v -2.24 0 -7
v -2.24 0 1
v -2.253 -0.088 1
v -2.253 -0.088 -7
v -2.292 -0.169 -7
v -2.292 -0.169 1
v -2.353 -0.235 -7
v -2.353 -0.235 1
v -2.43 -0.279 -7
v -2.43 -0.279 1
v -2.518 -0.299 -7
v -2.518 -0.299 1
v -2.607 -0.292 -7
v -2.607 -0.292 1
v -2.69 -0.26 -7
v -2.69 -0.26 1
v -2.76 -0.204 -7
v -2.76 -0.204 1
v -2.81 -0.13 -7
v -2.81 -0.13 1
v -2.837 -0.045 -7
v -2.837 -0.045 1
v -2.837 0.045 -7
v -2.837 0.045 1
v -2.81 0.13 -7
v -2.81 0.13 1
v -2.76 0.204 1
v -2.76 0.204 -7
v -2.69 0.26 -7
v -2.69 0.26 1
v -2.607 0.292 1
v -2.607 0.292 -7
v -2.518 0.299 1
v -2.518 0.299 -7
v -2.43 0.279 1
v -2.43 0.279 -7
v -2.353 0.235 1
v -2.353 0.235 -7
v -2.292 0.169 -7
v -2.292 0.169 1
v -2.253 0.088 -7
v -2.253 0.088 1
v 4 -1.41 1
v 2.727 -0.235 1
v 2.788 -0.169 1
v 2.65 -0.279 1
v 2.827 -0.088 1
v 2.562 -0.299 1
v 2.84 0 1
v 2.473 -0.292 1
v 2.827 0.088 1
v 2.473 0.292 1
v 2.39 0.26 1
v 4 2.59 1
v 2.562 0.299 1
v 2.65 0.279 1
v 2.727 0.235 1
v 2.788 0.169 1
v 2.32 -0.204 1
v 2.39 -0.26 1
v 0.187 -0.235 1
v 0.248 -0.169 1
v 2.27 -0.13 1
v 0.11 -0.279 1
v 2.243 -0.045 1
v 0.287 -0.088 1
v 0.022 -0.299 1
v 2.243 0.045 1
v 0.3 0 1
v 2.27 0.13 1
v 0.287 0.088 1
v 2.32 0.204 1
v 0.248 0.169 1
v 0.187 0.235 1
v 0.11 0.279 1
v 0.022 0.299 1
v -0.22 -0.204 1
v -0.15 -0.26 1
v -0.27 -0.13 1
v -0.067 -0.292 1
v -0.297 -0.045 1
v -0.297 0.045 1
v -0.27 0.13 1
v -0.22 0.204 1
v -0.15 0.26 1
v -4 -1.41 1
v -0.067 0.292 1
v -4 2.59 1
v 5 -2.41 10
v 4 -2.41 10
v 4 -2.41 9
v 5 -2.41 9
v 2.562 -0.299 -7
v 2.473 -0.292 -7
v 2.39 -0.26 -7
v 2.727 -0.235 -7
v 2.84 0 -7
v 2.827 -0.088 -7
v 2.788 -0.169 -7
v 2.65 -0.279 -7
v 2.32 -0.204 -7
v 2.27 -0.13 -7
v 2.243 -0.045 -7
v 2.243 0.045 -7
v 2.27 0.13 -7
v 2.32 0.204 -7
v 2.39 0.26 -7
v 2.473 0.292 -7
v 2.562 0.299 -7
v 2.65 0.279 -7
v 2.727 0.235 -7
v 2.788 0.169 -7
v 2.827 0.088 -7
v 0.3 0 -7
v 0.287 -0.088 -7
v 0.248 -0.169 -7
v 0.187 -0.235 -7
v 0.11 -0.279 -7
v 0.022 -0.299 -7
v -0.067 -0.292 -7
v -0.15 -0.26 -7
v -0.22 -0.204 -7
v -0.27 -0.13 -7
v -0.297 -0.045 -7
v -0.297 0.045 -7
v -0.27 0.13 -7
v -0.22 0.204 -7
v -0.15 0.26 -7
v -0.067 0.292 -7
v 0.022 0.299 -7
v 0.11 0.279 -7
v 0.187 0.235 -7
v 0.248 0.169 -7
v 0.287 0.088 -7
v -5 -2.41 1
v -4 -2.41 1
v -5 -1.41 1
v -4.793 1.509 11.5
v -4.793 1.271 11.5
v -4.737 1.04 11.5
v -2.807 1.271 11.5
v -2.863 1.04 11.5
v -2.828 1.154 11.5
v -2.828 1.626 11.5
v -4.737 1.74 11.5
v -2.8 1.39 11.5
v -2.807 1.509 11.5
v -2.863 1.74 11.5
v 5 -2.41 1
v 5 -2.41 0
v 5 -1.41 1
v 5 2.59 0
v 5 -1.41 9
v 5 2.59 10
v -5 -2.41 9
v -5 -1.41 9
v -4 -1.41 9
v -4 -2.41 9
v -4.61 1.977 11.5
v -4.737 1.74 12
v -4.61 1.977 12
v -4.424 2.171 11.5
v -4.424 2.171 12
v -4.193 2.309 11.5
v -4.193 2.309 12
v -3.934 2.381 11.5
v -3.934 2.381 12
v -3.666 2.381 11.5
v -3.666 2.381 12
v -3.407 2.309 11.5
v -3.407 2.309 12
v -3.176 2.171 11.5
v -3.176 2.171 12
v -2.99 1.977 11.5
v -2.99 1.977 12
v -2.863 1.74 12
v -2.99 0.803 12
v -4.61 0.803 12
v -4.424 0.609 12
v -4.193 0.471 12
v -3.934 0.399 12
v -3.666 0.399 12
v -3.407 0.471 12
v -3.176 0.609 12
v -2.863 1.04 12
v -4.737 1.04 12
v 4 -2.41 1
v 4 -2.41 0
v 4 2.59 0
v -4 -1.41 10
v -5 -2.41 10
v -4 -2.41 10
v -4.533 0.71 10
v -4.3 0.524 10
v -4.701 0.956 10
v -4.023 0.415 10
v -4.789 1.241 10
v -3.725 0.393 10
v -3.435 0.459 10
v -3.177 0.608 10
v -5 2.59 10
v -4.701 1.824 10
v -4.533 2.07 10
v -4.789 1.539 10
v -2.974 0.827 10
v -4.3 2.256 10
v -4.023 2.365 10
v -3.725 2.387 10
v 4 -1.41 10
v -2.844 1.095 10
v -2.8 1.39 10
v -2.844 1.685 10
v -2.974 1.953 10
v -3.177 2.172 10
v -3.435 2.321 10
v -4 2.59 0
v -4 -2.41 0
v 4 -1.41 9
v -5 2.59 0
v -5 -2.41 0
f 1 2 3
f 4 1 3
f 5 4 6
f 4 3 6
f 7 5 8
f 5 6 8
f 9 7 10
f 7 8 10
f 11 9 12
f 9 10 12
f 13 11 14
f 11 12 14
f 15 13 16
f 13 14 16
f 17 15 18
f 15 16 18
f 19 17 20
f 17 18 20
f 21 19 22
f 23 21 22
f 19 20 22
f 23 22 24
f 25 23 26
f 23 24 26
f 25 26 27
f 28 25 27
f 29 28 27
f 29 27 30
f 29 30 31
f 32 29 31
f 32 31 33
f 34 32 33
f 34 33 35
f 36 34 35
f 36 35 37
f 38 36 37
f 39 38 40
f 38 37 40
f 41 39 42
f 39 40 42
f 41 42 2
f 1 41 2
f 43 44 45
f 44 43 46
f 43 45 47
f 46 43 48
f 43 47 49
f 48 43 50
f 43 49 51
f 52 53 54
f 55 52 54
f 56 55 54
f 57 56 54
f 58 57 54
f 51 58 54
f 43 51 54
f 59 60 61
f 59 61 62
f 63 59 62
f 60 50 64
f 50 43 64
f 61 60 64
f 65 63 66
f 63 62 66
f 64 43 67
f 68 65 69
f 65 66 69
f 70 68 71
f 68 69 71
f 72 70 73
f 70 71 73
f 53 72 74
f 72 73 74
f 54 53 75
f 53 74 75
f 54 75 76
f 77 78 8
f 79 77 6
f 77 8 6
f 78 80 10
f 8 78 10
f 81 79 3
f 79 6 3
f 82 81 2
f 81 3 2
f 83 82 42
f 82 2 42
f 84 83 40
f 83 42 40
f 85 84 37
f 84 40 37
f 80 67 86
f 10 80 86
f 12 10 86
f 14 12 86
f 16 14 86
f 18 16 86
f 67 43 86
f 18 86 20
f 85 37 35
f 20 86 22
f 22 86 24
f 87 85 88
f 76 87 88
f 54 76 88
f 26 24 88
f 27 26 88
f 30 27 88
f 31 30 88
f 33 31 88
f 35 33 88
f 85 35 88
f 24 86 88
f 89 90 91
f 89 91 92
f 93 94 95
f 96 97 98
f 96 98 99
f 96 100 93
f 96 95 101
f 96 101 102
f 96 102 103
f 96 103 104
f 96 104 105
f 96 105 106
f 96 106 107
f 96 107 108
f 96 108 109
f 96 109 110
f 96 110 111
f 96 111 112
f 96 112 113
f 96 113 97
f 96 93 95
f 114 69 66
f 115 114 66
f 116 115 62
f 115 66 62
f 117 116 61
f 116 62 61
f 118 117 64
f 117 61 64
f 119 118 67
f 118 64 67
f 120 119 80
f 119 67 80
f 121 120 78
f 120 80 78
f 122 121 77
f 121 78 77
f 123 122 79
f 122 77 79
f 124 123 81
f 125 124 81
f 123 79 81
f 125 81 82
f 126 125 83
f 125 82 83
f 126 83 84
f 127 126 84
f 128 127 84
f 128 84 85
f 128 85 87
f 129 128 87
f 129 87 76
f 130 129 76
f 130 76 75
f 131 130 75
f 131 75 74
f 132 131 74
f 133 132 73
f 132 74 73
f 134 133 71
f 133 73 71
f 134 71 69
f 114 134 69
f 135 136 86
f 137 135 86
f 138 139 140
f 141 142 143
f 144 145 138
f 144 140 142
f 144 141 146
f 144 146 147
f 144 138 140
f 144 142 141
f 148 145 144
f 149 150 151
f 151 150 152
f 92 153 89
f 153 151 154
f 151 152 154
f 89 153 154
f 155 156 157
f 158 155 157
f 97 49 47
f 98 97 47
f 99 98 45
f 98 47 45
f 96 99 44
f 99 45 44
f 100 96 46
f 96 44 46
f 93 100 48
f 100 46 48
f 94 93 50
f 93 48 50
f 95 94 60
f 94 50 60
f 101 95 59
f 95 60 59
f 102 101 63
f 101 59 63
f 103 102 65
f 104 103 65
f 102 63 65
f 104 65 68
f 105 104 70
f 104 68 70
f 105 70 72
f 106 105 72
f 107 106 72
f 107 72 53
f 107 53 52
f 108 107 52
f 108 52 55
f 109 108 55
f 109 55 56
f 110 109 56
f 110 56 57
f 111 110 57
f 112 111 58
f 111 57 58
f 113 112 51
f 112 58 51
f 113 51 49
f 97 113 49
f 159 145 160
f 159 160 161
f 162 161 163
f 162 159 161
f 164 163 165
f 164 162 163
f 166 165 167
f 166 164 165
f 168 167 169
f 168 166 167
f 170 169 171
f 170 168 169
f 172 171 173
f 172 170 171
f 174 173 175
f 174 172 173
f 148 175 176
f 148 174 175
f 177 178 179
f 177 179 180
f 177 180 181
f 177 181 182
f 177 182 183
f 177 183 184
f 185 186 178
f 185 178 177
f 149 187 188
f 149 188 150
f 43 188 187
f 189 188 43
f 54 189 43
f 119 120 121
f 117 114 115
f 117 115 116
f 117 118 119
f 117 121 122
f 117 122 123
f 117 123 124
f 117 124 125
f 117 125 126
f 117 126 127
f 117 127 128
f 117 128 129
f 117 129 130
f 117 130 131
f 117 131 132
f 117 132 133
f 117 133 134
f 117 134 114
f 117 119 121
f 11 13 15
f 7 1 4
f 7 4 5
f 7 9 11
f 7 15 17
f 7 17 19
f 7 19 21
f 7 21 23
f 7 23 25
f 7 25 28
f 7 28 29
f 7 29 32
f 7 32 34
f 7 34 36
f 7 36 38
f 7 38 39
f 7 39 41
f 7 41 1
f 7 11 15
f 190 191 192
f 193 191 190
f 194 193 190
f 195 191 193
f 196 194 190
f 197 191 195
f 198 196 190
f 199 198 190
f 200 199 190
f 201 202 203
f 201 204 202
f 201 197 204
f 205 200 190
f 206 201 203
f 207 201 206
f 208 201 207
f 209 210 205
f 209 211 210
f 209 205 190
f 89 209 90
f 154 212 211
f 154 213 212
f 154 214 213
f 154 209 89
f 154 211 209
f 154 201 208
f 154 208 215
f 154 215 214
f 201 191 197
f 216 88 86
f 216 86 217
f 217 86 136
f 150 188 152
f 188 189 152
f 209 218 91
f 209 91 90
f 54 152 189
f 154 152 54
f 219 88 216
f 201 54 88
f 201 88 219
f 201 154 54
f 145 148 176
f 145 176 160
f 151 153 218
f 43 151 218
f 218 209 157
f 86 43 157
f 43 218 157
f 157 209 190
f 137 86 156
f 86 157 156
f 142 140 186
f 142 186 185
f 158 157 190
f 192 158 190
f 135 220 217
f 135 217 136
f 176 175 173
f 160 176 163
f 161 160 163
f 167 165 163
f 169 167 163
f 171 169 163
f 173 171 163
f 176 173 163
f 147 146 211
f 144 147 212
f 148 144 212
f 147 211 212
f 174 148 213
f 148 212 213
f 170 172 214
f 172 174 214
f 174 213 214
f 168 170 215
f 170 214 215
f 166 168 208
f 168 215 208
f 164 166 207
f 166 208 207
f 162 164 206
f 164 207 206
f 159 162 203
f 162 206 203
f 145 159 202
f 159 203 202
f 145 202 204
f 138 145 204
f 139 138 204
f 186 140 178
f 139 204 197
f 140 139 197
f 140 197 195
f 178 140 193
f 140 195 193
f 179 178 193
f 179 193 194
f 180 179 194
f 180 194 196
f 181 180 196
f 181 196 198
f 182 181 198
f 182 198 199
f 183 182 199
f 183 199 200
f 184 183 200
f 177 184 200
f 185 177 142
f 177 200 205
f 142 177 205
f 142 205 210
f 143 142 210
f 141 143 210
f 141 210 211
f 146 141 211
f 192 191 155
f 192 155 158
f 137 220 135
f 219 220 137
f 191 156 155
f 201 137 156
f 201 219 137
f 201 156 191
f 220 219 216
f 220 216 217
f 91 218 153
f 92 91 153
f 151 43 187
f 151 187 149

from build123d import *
from build123d.topology import SkipClean

# Parameters (mm, degrees)
SKETCH_1_W          = 5
SKETCH_1_H          = 10
EXTRUDE_1_DEPTH     = 1
SKETCH_2_W          = 9
SKETCH_2_H          = 1
CUT_EXTRUDE_1_DEPTH = 11.378251298
SKETCH_3_W          = 9
SKETCH_3_H          = 4
EXTRUDE_2_DEPTH     = 9
SKETCH_4_W          = 1
SKETCH_4_H          = 4
EXTRUDE_3_DEPTH     = 1
SKETCH_5_W          = 1
SKETCH_5_H          = 1
EXTRUDE_4_DEPTH     = 1
SKETCH_6_W          = 1
SKETCH_6_H          = 1
EXTRUDE_5_DEPTH     = 1
SKETCH_7_W          = 1
SKETCH_7_H          = 1
EXTRUDE_6_DEPTH     = 1
SKETCH_8_R          = 1
EXTRUDE_7_DEPTH     = 2
CUT_EXTRUDE_START   = -0.5
CUT_EXTRUDE_2_DEPTH = 0.5
EXTRUDE_8_DEPTH     = 0.5
SKETCH_11_R         = 0.3
EXTRUDE_9_DEPTH     = 8
SKETCH_12_R         = 0.3
EXTRUDE_10_DEPTH    = 8
SKETCH_13_R         = 0.3
EXTRUDE_11_DEPTH    = 8


with BuildPart() as part:
    # Эскиз1 → Бобышка-Вытянуть1 (new body)
    with BuildSketch(Plane(origin=(-5, 0, 0), x_dir=(0, -1, 0), z_dir=(-1, 0, 0))):
        with Locations((-0.09, 5)):
            Rectangle(SKETCH_1_W, SKETCH_1_H)
    extrude(amount=-EXTRUDE_1_DEPTH)

    # Эскиз2 → Вырез-Вытянуть1 (cut, through all)
    with BuildSketch(Plane(origin=(-4, 0, 0), x_dir=(0, 0, -1), z_dir=(1, 0, 0))):
        with Locations((-5.5, -1.91)):
            Rectangle(SKETCH_2_W, SKETCH_2_H)
    extrude(amount=-CUT_EXTRUDE_1_DEPTH, mode=Mode.SUBTRACT)

    # Эскиз3 → Бобышка-Вытянуть2 (add)
    with BuildSketch(Plane(origin=(-4, 0, 0), x_dir=(0, 0, -1), z_dir=(1, 0, 0))):
        with Locations((-5.5, 0.59)):
            Rectangle(SKETCH_3_W, SKETCH_3_H)
    extrude(amount=EXTRUDE_2_DEPTH)

    # Эскиз4 → Бобышка-Вытянуть3 (add)
    with BuildSketch(Plane(origin=(0, 0, 1), x_dir=(-1, 0, 0), z_dir=(0, 0, -1))):
        with Locations((-4.5, 0.59)):
            Rectangle(SKETCH_4_W, SKETCH_4_H)
    extrude(amount=EXTRUDE_3_DEPTH)

    # Эскиз5 → Бобышка-Вытянуть4 (add)
    with BuildSketch(Plane.XZ.offset(1.41)):
        with Locations((4.5, 0.5)):
            Rectangle(SKETCH_5_W, SKETCH_5_H)
    extrude(amount=EXTRUDE_4_DEPTH)

    # Эскиз6 → Бобышка-Вытянуть5 (add)
    with BuildSketch(Plane.XZ.offset(1.41)):
        with Locations((-4.5, 9.5)):
            Rectangle(SKETCH_6_W, SKETCH_6_H)
    extrude(amount=EXTRUDE_5_DEPTH)

    # Эскиз7 → Бобышка-Вытянуть6 (add)
    with BuildSketch(Plane.XZ.offset(1.41)):
        with Locations((4.5, 9.5)):
            Rectangle(SKETCH_7_W, SKETCH_7_H)
    extrude(amount=EXTRUDE_6_DEPTH)

    # Эскиз8 → Бобышка-Вытянуть7 (add)
    with BuildSketch(Plane.XY.offset(10)):
        with Locations((-3.8, 1.39)):
            Circle(SKETCH_8_R)
    extrude(amount=EXTRUDE_7_DEPTH)

    # Эскиз9 → Вырез-Вытянуть2 (cut)
    with BuildSketch(Plane.XY.offset(12).offset(CUT_EXTRUDE_START)):
        with BuildLine():
            Line((-4.7367497, 1.04), (-2.8632503, 1.04))
            ThreePointArc((-2.8632503, 1.04), (-3.8, 2.39), (-4.7367497, 1.04))
        make_face()
    extrude(amount=CUT_EXTRUDE_2_DEPTH, mode=Mode.SUBTRACT)

    # Эскиз10 → Бобышка-Вытянуть8 (add)
    with SkipClean():  # the faces are left unmerged after this step: merging them gives an invalid solid
        with BuildSketch(Plane.XY.offset(11.5)):
            with BuildLine():
                Line((-2.8632503, 1.74), (-4.7367497, 1.74))
                ThreePointArc((-4.7367497, 1.74), (-3.8, 2.39), (-2.8632503, 1.74))
            make_face()
        extrude(amount=EXTRUDE_8_DEPTH)

    # Эскиз11 → Бобышка-Вытянуть9 (add)
    with SkipClean():  # the faces are left unmerged after this step: merging them gives an invalid solid
        with BuildSketch(Plane(origin=(0, 0, 1), x_dir=(-1, 0, 0), z_dir=(0, 0, -1))):
            with Locations(Location((-2.54, 0, 0), (0, 0, 180))):
                Circle(SKETCH_11_R)
        extrude(amount=EXTRUDE_9_DEPTH)

    # Эскиз12 → Бобышка-Вытянуть10 (add)
    with SkipClean():  # the faces are left unmerged after this step: merging them gives an invalid solid
        with BuildSketch(Plane(origin=(0, 0, 1), x_dir=(-1, 0, 0), z_dir=(0, 0, -1))):
            with Locations(Location((0, 0, 0), (0, 0, 180))):
                Circle(SKETCH_12_R)
        extrude(amount=EXTRUDE_10_DEPTH)

    # Эскиз13 → Бобышка-Вытянуть11 (add)
    with SkipClean():  # the faces are left unmerged after this step: merging them gives an invalid solid
        with BuildSketch(Plane(origin=(0, 0, 1), x_dir=(-1, 0, 0), z_dir=(0, 0, -1))):
            with Locations(Location((2.54, 0, 0), (0, 0, 180))):
                Circle(SKETCH_13_R)
        extrude(amount=EXTRUDE_11_DEPTH)


solid = part.part
